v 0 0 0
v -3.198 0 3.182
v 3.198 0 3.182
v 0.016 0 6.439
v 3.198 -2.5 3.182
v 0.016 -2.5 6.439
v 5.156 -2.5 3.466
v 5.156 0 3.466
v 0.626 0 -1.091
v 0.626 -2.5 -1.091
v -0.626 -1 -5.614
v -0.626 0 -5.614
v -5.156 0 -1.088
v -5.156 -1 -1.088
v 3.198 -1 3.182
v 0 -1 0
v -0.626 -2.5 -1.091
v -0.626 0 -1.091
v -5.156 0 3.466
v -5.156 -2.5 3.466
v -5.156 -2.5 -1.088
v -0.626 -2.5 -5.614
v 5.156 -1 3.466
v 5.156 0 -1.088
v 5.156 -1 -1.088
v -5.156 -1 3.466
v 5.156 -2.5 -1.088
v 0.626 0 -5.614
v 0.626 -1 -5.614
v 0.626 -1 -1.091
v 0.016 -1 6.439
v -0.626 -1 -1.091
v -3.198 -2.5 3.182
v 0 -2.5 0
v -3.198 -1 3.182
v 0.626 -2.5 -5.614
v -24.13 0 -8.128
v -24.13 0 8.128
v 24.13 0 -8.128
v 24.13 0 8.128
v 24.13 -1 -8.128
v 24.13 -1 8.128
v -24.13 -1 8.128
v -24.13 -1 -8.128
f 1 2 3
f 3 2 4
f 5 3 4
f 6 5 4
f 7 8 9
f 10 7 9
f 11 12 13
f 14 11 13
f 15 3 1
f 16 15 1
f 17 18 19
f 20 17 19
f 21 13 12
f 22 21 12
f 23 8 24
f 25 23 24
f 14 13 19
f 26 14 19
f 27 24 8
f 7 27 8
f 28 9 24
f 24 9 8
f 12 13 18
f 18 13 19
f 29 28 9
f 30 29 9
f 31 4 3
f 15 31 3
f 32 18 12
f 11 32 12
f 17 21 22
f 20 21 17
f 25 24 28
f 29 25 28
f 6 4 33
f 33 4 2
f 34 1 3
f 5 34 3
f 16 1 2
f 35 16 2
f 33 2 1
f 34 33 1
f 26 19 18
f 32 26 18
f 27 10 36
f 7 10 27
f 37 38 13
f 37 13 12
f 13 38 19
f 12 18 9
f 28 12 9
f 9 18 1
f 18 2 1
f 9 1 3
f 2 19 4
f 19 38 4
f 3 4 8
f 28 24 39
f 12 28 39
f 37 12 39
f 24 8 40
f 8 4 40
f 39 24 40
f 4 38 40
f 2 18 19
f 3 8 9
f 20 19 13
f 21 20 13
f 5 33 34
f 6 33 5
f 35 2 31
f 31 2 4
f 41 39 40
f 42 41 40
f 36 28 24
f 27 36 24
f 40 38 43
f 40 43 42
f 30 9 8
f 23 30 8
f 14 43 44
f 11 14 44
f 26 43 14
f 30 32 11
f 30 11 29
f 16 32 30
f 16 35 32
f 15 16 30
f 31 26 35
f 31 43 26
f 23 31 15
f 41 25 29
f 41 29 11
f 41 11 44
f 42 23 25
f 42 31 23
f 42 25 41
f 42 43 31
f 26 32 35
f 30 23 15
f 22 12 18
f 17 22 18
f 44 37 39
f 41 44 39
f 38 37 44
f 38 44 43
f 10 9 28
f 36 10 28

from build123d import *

# Parameters (mm, degrees)
F1_DEPTH = 2.5
F0_W     = 48.26
F0_H     = 16.256
F2_DEPTH = 1


with BuildPart() as f1:
    # F0 (on Front) → F1 (new body)
    with BuildSketch(Plane.XZ):
        Polygon((-0.626079, -1.090966), (-5.15557, 3.46575), (-5.15557, -1.088407), (-0.626079, -5.613511), align=None)
        Polygon((3.197788, 3.181963), (0.015708, 6.438897), (-3.197788, 3.181963), (0, 0), align=None)
        Polygon((5.15557, 3.46575), (0.626079, -1.090966), (0.626079, -5.613511), (5.15557, -1.088407), align=None)
    extrude(amount=F1_DEPTH)


with BuildPart() as f2:
    # F0 (on Front) → F2 (new body)
    with BuildSketch(Plane.XZ):
        Rectangle(F0_W, F0_H)
        Polygon((-5.15557, -1.088407), (-5.15557, 3.46575), (-0.626079, -1.090966), (-0.626079, -5.613511), align=None, mode=Mode.SUBTRACT)
        Polygon((0.626079, -5.613511), (0.626079, -1.090966), (5.15557, 3.46575), (5.15557, -1.088407), align=None, mode=Mode.SUBTRACT)
        Polygon((-3.197788, 3.181963), (0.015708, 6.438897), (3.197788, 3.181963), (0, 0), align=None, mode=Mode.SUBTRACT)
    extrude(amount=F2_DEPTH)


solid = Compound([f1.part, f2.part])
